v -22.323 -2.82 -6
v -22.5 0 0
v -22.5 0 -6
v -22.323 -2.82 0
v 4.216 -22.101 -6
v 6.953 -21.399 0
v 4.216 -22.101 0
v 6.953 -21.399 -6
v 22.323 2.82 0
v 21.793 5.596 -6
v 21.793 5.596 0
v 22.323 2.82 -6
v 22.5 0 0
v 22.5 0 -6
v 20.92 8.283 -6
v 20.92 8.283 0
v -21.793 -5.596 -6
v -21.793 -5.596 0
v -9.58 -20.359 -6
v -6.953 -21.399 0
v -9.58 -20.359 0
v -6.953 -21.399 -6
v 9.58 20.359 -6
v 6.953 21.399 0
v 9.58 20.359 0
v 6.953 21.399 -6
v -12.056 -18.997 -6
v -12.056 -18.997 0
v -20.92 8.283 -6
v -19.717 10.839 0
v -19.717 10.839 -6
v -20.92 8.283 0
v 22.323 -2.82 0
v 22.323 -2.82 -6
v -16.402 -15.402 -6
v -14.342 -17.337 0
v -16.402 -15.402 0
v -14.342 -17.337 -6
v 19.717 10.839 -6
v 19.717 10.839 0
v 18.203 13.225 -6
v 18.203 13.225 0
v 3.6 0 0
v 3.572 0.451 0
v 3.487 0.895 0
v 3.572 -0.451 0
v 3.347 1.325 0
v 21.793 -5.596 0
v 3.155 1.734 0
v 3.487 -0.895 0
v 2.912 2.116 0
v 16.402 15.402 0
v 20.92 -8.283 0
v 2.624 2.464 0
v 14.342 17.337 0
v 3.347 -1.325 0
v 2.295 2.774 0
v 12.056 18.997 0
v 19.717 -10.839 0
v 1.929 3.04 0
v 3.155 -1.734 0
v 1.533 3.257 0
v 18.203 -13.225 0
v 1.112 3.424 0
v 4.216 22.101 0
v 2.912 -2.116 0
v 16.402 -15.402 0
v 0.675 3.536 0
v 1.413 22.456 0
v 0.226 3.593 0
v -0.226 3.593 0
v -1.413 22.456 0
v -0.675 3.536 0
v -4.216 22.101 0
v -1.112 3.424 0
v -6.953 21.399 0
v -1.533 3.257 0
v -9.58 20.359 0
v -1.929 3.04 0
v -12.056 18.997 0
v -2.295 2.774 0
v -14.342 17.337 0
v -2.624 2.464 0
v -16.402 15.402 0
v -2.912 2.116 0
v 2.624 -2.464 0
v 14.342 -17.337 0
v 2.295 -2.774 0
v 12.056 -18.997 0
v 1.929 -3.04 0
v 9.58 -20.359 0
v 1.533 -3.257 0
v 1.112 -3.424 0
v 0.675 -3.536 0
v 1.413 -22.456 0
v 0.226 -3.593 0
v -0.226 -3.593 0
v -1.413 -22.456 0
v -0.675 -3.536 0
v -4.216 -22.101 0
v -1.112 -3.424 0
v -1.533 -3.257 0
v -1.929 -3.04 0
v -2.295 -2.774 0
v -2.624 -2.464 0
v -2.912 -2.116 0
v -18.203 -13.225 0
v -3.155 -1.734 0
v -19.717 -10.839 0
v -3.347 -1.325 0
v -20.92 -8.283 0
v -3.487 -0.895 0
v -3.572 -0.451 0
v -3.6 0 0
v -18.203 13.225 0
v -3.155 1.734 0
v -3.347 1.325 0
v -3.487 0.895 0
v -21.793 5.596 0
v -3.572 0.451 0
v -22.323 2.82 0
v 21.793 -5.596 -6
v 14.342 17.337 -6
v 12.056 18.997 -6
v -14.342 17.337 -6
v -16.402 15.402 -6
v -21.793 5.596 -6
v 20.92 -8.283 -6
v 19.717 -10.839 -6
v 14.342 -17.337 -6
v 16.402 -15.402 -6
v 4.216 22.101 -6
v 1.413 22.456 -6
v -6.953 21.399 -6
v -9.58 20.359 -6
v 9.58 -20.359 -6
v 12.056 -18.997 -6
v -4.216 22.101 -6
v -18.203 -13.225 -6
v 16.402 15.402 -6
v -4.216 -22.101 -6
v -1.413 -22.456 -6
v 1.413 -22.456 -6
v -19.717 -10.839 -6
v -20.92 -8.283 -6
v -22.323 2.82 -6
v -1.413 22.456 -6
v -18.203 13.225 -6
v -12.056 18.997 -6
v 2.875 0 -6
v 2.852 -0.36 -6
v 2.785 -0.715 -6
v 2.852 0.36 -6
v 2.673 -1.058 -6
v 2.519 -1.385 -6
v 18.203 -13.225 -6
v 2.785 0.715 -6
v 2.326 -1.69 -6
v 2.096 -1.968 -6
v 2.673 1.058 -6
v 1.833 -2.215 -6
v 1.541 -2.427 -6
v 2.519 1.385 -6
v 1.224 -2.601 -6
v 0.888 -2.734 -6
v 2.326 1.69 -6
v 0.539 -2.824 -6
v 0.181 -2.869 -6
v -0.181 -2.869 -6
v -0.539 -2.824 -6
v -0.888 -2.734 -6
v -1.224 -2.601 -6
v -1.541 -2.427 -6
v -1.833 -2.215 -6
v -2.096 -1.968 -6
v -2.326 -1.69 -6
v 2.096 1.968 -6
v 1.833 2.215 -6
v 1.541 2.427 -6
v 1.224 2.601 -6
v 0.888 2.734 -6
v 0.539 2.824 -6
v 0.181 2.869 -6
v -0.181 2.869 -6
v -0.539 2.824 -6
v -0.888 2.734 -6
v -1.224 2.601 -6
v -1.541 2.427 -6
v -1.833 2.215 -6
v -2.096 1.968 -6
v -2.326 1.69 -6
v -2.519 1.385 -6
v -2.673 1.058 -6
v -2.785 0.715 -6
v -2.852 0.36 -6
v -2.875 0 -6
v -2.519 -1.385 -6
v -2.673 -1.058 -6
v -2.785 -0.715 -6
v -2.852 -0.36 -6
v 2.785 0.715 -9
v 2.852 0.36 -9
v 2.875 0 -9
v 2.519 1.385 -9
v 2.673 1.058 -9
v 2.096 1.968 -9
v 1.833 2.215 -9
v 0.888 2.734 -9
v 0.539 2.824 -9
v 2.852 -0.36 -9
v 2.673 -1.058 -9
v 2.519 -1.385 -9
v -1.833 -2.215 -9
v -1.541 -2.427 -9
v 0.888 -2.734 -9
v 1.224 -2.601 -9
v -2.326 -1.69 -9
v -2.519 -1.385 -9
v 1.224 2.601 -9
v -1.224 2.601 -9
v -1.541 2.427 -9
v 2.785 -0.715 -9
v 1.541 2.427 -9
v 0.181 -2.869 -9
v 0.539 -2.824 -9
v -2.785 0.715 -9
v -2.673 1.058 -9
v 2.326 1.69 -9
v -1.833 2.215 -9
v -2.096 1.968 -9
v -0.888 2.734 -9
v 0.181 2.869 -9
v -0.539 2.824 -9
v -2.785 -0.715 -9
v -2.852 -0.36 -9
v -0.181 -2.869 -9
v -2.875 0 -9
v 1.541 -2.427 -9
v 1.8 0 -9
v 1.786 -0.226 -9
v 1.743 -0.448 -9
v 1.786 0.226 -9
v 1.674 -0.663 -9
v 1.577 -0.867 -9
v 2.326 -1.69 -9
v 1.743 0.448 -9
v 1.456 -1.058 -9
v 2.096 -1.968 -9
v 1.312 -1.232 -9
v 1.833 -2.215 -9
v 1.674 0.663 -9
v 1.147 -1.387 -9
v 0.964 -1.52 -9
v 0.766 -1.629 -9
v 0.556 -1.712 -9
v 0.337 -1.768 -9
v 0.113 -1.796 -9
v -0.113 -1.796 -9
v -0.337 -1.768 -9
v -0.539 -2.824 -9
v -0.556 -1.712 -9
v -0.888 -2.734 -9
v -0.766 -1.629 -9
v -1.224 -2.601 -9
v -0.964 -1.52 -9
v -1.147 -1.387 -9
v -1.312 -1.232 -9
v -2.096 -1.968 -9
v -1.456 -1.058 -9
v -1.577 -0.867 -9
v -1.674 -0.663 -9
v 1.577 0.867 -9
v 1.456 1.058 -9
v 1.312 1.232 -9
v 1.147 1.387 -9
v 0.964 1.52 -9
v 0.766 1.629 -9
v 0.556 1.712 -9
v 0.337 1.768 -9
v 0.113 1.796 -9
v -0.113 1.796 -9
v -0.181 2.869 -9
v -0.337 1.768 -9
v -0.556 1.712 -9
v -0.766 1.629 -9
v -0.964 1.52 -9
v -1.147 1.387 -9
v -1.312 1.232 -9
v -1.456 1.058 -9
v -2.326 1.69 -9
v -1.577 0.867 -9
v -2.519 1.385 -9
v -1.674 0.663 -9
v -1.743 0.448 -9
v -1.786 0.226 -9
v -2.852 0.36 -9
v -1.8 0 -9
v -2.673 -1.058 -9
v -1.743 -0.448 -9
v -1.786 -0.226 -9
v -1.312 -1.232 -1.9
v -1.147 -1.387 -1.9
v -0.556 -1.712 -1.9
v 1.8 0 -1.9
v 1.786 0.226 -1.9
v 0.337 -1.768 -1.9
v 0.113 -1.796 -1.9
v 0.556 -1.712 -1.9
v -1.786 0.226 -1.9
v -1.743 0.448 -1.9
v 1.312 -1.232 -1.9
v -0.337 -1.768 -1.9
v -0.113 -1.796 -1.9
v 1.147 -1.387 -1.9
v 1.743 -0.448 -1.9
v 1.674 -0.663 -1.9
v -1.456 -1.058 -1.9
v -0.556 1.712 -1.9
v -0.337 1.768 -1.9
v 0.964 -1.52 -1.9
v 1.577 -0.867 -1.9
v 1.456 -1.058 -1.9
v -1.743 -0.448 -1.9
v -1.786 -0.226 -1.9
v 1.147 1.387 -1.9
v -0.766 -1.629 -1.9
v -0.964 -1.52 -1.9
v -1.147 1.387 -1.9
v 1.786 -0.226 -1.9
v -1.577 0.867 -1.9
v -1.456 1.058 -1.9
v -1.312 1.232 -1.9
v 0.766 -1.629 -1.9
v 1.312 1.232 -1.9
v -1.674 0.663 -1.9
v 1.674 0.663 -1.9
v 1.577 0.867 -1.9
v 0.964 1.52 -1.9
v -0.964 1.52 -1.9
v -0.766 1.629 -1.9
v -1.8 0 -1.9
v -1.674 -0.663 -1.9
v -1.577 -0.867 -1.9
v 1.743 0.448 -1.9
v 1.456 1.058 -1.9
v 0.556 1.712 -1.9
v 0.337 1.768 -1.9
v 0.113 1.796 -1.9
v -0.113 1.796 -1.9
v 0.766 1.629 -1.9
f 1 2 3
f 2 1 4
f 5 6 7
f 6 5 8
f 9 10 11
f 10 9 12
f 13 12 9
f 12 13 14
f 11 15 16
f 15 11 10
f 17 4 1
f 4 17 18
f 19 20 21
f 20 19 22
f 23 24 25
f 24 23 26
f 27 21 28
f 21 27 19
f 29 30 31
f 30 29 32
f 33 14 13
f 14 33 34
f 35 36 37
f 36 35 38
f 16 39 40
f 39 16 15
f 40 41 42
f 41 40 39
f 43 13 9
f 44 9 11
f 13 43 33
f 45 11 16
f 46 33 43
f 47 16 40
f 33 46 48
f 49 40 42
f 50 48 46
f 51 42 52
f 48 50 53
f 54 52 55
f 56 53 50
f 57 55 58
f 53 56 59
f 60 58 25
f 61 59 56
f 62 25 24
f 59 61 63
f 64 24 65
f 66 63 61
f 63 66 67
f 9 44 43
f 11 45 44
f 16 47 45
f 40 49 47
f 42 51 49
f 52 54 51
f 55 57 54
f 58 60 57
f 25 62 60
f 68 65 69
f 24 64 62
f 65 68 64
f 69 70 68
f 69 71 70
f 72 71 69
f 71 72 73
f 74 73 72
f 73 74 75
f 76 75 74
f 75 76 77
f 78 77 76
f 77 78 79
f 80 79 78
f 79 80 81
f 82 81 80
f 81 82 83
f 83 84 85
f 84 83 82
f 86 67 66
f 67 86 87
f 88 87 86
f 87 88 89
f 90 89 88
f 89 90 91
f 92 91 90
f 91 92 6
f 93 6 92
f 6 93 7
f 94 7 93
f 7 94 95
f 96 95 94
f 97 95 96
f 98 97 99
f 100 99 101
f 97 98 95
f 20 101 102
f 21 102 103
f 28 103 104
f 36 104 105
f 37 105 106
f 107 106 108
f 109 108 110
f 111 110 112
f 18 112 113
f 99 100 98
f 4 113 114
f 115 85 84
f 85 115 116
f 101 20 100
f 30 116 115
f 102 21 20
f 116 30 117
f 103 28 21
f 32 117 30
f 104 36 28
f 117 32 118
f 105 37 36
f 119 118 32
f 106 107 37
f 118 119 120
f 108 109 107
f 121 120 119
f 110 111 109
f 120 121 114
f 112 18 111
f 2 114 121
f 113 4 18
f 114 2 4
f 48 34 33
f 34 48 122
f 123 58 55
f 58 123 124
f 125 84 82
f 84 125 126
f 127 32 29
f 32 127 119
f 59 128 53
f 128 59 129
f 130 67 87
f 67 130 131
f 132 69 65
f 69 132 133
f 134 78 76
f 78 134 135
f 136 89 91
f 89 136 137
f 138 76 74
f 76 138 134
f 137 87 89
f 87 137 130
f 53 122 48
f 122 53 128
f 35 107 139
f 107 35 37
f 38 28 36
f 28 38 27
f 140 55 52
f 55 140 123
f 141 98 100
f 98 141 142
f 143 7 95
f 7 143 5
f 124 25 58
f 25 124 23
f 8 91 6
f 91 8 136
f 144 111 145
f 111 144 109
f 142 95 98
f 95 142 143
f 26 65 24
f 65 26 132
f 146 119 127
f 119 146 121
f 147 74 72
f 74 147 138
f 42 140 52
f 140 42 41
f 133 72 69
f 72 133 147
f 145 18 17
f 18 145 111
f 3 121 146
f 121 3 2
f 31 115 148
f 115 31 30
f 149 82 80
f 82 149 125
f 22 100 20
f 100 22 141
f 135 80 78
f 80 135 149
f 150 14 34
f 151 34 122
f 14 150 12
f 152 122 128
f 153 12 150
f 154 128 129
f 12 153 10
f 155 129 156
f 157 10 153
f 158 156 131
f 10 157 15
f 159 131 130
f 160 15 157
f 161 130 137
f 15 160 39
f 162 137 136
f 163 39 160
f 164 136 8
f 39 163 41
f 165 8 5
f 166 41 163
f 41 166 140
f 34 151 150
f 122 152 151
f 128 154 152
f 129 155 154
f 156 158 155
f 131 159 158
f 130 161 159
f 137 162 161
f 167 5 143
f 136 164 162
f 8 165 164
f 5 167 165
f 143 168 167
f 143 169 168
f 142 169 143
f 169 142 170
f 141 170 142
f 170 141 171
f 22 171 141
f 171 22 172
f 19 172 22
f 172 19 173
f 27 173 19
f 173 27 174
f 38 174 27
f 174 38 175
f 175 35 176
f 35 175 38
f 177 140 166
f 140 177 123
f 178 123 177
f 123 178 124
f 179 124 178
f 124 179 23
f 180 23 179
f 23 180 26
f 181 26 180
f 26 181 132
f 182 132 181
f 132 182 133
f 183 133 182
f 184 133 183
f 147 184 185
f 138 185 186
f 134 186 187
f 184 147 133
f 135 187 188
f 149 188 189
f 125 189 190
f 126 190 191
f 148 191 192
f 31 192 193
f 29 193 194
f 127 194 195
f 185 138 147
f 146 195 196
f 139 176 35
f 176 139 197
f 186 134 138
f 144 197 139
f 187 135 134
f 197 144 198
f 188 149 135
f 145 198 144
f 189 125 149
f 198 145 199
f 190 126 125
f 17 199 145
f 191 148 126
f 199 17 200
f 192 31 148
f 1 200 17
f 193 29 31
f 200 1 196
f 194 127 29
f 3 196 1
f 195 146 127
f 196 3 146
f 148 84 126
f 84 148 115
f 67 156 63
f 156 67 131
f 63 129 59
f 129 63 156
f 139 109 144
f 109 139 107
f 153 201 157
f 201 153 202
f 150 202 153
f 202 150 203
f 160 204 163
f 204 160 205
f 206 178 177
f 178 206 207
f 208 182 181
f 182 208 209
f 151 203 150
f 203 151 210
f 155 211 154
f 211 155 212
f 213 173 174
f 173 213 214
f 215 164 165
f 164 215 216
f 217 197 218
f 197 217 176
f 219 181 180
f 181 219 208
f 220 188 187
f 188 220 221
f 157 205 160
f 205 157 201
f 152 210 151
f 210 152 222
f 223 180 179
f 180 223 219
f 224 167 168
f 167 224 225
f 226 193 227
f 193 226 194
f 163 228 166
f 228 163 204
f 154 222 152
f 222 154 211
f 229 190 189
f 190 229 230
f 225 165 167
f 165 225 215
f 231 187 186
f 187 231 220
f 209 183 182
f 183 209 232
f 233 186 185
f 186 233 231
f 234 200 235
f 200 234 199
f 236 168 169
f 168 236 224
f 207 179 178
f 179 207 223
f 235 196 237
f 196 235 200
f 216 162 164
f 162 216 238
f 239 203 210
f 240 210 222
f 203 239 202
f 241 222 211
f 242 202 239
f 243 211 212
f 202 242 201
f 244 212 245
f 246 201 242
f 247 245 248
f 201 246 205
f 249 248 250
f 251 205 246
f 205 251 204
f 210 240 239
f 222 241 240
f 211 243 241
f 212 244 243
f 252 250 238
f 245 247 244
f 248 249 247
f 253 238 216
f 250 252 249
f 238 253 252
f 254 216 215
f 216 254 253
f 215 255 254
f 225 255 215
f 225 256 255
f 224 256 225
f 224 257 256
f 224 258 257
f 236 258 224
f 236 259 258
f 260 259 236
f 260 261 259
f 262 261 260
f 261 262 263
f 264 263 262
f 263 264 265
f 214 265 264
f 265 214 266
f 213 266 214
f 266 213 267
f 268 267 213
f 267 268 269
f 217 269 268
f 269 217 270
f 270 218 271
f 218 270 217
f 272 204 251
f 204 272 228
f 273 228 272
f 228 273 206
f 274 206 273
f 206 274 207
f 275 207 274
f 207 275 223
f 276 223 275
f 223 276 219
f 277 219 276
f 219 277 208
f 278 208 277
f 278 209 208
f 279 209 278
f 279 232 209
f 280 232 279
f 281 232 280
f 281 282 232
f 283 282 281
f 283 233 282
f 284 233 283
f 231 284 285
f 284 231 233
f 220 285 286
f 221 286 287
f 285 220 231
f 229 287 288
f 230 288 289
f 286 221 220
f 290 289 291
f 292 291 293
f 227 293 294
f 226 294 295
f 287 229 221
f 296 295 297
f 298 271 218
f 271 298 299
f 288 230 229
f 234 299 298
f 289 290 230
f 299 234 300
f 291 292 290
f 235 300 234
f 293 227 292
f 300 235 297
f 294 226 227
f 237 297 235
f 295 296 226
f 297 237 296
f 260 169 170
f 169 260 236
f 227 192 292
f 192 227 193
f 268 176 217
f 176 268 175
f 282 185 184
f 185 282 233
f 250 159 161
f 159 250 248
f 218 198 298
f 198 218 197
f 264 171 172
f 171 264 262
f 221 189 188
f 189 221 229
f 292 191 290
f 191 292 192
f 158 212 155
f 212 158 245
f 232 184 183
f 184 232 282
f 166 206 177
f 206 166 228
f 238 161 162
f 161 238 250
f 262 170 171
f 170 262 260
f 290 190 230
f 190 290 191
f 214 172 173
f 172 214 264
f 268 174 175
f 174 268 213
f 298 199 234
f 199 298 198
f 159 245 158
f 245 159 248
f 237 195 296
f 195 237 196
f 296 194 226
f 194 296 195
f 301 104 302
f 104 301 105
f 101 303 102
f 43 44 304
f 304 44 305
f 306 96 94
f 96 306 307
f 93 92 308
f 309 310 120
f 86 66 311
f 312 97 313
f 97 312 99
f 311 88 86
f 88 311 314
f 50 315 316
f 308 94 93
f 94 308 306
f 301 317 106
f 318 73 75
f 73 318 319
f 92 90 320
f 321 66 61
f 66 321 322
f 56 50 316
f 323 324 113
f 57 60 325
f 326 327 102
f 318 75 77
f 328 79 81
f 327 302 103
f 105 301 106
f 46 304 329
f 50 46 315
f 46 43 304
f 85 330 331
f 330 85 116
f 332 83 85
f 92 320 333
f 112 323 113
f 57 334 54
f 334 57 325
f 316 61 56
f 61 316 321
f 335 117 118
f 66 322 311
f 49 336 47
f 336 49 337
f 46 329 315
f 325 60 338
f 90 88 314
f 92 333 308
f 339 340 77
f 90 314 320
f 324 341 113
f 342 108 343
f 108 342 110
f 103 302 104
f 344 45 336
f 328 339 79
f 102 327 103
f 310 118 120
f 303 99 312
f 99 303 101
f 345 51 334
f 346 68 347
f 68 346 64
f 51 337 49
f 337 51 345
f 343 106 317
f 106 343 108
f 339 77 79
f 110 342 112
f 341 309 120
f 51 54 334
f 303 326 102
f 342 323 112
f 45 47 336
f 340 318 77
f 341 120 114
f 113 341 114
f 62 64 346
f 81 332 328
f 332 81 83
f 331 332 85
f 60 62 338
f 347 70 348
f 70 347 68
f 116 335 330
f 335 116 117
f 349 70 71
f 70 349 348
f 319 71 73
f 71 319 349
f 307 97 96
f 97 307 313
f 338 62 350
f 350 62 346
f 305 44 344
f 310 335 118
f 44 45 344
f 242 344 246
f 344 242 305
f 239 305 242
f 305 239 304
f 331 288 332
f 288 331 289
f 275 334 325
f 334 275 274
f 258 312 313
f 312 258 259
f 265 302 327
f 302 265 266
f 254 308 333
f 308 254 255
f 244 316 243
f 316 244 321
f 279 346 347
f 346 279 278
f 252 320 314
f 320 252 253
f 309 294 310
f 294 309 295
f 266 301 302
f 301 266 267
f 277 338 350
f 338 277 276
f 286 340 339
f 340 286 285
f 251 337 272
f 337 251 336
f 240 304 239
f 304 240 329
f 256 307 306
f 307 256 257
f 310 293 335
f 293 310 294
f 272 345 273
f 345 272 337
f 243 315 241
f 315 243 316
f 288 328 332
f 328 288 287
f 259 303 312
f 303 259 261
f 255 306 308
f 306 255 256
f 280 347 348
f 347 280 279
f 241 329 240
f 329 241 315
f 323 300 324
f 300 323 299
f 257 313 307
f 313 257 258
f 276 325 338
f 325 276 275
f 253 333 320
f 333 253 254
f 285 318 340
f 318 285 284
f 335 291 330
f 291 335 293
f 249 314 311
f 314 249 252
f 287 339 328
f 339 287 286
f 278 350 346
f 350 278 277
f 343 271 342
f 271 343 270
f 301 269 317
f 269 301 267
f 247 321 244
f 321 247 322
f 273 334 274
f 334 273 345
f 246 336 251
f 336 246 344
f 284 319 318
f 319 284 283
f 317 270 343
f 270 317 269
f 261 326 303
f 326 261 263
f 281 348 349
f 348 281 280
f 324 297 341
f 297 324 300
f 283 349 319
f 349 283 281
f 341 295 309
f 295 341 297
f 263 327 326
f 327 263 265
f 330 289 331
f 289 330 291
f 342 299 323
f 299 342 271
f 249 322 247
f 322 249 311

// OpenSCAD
$fn = 50;

difference() {
	union() {
		translate(v = [0, 0, -6.0]) {
			cylinder(h = 6, r = 22.5);
		}
		#translate(v = [0, 0, -9.0]) {
			cylinder(h = 9, r = 2.875);
		}
	}
	union() {
		translate(v = [0, 0, 0]) {
			rotate(a = [0, 0, 0]) {
				difference() {
					union() {
						translate(v = [0, 0, -9.0]) {
							cylinder(h = 9, r = 1.5);
						}
						translate(v = [0, 0, -1.9]) {
							cylinder(h = 1.9, r1 = 1.8, r2 = 3.6);
						}
						translate(v = [0, 0, -9.0]) {
							cylinder(h = 9, r = 1.8);
						}
						translate(v = [0, 0, -9.0]) {
							cylinder(h = 9, r = 1.5);
						}
					}
					union();
				}
			}
		}
	}
}
